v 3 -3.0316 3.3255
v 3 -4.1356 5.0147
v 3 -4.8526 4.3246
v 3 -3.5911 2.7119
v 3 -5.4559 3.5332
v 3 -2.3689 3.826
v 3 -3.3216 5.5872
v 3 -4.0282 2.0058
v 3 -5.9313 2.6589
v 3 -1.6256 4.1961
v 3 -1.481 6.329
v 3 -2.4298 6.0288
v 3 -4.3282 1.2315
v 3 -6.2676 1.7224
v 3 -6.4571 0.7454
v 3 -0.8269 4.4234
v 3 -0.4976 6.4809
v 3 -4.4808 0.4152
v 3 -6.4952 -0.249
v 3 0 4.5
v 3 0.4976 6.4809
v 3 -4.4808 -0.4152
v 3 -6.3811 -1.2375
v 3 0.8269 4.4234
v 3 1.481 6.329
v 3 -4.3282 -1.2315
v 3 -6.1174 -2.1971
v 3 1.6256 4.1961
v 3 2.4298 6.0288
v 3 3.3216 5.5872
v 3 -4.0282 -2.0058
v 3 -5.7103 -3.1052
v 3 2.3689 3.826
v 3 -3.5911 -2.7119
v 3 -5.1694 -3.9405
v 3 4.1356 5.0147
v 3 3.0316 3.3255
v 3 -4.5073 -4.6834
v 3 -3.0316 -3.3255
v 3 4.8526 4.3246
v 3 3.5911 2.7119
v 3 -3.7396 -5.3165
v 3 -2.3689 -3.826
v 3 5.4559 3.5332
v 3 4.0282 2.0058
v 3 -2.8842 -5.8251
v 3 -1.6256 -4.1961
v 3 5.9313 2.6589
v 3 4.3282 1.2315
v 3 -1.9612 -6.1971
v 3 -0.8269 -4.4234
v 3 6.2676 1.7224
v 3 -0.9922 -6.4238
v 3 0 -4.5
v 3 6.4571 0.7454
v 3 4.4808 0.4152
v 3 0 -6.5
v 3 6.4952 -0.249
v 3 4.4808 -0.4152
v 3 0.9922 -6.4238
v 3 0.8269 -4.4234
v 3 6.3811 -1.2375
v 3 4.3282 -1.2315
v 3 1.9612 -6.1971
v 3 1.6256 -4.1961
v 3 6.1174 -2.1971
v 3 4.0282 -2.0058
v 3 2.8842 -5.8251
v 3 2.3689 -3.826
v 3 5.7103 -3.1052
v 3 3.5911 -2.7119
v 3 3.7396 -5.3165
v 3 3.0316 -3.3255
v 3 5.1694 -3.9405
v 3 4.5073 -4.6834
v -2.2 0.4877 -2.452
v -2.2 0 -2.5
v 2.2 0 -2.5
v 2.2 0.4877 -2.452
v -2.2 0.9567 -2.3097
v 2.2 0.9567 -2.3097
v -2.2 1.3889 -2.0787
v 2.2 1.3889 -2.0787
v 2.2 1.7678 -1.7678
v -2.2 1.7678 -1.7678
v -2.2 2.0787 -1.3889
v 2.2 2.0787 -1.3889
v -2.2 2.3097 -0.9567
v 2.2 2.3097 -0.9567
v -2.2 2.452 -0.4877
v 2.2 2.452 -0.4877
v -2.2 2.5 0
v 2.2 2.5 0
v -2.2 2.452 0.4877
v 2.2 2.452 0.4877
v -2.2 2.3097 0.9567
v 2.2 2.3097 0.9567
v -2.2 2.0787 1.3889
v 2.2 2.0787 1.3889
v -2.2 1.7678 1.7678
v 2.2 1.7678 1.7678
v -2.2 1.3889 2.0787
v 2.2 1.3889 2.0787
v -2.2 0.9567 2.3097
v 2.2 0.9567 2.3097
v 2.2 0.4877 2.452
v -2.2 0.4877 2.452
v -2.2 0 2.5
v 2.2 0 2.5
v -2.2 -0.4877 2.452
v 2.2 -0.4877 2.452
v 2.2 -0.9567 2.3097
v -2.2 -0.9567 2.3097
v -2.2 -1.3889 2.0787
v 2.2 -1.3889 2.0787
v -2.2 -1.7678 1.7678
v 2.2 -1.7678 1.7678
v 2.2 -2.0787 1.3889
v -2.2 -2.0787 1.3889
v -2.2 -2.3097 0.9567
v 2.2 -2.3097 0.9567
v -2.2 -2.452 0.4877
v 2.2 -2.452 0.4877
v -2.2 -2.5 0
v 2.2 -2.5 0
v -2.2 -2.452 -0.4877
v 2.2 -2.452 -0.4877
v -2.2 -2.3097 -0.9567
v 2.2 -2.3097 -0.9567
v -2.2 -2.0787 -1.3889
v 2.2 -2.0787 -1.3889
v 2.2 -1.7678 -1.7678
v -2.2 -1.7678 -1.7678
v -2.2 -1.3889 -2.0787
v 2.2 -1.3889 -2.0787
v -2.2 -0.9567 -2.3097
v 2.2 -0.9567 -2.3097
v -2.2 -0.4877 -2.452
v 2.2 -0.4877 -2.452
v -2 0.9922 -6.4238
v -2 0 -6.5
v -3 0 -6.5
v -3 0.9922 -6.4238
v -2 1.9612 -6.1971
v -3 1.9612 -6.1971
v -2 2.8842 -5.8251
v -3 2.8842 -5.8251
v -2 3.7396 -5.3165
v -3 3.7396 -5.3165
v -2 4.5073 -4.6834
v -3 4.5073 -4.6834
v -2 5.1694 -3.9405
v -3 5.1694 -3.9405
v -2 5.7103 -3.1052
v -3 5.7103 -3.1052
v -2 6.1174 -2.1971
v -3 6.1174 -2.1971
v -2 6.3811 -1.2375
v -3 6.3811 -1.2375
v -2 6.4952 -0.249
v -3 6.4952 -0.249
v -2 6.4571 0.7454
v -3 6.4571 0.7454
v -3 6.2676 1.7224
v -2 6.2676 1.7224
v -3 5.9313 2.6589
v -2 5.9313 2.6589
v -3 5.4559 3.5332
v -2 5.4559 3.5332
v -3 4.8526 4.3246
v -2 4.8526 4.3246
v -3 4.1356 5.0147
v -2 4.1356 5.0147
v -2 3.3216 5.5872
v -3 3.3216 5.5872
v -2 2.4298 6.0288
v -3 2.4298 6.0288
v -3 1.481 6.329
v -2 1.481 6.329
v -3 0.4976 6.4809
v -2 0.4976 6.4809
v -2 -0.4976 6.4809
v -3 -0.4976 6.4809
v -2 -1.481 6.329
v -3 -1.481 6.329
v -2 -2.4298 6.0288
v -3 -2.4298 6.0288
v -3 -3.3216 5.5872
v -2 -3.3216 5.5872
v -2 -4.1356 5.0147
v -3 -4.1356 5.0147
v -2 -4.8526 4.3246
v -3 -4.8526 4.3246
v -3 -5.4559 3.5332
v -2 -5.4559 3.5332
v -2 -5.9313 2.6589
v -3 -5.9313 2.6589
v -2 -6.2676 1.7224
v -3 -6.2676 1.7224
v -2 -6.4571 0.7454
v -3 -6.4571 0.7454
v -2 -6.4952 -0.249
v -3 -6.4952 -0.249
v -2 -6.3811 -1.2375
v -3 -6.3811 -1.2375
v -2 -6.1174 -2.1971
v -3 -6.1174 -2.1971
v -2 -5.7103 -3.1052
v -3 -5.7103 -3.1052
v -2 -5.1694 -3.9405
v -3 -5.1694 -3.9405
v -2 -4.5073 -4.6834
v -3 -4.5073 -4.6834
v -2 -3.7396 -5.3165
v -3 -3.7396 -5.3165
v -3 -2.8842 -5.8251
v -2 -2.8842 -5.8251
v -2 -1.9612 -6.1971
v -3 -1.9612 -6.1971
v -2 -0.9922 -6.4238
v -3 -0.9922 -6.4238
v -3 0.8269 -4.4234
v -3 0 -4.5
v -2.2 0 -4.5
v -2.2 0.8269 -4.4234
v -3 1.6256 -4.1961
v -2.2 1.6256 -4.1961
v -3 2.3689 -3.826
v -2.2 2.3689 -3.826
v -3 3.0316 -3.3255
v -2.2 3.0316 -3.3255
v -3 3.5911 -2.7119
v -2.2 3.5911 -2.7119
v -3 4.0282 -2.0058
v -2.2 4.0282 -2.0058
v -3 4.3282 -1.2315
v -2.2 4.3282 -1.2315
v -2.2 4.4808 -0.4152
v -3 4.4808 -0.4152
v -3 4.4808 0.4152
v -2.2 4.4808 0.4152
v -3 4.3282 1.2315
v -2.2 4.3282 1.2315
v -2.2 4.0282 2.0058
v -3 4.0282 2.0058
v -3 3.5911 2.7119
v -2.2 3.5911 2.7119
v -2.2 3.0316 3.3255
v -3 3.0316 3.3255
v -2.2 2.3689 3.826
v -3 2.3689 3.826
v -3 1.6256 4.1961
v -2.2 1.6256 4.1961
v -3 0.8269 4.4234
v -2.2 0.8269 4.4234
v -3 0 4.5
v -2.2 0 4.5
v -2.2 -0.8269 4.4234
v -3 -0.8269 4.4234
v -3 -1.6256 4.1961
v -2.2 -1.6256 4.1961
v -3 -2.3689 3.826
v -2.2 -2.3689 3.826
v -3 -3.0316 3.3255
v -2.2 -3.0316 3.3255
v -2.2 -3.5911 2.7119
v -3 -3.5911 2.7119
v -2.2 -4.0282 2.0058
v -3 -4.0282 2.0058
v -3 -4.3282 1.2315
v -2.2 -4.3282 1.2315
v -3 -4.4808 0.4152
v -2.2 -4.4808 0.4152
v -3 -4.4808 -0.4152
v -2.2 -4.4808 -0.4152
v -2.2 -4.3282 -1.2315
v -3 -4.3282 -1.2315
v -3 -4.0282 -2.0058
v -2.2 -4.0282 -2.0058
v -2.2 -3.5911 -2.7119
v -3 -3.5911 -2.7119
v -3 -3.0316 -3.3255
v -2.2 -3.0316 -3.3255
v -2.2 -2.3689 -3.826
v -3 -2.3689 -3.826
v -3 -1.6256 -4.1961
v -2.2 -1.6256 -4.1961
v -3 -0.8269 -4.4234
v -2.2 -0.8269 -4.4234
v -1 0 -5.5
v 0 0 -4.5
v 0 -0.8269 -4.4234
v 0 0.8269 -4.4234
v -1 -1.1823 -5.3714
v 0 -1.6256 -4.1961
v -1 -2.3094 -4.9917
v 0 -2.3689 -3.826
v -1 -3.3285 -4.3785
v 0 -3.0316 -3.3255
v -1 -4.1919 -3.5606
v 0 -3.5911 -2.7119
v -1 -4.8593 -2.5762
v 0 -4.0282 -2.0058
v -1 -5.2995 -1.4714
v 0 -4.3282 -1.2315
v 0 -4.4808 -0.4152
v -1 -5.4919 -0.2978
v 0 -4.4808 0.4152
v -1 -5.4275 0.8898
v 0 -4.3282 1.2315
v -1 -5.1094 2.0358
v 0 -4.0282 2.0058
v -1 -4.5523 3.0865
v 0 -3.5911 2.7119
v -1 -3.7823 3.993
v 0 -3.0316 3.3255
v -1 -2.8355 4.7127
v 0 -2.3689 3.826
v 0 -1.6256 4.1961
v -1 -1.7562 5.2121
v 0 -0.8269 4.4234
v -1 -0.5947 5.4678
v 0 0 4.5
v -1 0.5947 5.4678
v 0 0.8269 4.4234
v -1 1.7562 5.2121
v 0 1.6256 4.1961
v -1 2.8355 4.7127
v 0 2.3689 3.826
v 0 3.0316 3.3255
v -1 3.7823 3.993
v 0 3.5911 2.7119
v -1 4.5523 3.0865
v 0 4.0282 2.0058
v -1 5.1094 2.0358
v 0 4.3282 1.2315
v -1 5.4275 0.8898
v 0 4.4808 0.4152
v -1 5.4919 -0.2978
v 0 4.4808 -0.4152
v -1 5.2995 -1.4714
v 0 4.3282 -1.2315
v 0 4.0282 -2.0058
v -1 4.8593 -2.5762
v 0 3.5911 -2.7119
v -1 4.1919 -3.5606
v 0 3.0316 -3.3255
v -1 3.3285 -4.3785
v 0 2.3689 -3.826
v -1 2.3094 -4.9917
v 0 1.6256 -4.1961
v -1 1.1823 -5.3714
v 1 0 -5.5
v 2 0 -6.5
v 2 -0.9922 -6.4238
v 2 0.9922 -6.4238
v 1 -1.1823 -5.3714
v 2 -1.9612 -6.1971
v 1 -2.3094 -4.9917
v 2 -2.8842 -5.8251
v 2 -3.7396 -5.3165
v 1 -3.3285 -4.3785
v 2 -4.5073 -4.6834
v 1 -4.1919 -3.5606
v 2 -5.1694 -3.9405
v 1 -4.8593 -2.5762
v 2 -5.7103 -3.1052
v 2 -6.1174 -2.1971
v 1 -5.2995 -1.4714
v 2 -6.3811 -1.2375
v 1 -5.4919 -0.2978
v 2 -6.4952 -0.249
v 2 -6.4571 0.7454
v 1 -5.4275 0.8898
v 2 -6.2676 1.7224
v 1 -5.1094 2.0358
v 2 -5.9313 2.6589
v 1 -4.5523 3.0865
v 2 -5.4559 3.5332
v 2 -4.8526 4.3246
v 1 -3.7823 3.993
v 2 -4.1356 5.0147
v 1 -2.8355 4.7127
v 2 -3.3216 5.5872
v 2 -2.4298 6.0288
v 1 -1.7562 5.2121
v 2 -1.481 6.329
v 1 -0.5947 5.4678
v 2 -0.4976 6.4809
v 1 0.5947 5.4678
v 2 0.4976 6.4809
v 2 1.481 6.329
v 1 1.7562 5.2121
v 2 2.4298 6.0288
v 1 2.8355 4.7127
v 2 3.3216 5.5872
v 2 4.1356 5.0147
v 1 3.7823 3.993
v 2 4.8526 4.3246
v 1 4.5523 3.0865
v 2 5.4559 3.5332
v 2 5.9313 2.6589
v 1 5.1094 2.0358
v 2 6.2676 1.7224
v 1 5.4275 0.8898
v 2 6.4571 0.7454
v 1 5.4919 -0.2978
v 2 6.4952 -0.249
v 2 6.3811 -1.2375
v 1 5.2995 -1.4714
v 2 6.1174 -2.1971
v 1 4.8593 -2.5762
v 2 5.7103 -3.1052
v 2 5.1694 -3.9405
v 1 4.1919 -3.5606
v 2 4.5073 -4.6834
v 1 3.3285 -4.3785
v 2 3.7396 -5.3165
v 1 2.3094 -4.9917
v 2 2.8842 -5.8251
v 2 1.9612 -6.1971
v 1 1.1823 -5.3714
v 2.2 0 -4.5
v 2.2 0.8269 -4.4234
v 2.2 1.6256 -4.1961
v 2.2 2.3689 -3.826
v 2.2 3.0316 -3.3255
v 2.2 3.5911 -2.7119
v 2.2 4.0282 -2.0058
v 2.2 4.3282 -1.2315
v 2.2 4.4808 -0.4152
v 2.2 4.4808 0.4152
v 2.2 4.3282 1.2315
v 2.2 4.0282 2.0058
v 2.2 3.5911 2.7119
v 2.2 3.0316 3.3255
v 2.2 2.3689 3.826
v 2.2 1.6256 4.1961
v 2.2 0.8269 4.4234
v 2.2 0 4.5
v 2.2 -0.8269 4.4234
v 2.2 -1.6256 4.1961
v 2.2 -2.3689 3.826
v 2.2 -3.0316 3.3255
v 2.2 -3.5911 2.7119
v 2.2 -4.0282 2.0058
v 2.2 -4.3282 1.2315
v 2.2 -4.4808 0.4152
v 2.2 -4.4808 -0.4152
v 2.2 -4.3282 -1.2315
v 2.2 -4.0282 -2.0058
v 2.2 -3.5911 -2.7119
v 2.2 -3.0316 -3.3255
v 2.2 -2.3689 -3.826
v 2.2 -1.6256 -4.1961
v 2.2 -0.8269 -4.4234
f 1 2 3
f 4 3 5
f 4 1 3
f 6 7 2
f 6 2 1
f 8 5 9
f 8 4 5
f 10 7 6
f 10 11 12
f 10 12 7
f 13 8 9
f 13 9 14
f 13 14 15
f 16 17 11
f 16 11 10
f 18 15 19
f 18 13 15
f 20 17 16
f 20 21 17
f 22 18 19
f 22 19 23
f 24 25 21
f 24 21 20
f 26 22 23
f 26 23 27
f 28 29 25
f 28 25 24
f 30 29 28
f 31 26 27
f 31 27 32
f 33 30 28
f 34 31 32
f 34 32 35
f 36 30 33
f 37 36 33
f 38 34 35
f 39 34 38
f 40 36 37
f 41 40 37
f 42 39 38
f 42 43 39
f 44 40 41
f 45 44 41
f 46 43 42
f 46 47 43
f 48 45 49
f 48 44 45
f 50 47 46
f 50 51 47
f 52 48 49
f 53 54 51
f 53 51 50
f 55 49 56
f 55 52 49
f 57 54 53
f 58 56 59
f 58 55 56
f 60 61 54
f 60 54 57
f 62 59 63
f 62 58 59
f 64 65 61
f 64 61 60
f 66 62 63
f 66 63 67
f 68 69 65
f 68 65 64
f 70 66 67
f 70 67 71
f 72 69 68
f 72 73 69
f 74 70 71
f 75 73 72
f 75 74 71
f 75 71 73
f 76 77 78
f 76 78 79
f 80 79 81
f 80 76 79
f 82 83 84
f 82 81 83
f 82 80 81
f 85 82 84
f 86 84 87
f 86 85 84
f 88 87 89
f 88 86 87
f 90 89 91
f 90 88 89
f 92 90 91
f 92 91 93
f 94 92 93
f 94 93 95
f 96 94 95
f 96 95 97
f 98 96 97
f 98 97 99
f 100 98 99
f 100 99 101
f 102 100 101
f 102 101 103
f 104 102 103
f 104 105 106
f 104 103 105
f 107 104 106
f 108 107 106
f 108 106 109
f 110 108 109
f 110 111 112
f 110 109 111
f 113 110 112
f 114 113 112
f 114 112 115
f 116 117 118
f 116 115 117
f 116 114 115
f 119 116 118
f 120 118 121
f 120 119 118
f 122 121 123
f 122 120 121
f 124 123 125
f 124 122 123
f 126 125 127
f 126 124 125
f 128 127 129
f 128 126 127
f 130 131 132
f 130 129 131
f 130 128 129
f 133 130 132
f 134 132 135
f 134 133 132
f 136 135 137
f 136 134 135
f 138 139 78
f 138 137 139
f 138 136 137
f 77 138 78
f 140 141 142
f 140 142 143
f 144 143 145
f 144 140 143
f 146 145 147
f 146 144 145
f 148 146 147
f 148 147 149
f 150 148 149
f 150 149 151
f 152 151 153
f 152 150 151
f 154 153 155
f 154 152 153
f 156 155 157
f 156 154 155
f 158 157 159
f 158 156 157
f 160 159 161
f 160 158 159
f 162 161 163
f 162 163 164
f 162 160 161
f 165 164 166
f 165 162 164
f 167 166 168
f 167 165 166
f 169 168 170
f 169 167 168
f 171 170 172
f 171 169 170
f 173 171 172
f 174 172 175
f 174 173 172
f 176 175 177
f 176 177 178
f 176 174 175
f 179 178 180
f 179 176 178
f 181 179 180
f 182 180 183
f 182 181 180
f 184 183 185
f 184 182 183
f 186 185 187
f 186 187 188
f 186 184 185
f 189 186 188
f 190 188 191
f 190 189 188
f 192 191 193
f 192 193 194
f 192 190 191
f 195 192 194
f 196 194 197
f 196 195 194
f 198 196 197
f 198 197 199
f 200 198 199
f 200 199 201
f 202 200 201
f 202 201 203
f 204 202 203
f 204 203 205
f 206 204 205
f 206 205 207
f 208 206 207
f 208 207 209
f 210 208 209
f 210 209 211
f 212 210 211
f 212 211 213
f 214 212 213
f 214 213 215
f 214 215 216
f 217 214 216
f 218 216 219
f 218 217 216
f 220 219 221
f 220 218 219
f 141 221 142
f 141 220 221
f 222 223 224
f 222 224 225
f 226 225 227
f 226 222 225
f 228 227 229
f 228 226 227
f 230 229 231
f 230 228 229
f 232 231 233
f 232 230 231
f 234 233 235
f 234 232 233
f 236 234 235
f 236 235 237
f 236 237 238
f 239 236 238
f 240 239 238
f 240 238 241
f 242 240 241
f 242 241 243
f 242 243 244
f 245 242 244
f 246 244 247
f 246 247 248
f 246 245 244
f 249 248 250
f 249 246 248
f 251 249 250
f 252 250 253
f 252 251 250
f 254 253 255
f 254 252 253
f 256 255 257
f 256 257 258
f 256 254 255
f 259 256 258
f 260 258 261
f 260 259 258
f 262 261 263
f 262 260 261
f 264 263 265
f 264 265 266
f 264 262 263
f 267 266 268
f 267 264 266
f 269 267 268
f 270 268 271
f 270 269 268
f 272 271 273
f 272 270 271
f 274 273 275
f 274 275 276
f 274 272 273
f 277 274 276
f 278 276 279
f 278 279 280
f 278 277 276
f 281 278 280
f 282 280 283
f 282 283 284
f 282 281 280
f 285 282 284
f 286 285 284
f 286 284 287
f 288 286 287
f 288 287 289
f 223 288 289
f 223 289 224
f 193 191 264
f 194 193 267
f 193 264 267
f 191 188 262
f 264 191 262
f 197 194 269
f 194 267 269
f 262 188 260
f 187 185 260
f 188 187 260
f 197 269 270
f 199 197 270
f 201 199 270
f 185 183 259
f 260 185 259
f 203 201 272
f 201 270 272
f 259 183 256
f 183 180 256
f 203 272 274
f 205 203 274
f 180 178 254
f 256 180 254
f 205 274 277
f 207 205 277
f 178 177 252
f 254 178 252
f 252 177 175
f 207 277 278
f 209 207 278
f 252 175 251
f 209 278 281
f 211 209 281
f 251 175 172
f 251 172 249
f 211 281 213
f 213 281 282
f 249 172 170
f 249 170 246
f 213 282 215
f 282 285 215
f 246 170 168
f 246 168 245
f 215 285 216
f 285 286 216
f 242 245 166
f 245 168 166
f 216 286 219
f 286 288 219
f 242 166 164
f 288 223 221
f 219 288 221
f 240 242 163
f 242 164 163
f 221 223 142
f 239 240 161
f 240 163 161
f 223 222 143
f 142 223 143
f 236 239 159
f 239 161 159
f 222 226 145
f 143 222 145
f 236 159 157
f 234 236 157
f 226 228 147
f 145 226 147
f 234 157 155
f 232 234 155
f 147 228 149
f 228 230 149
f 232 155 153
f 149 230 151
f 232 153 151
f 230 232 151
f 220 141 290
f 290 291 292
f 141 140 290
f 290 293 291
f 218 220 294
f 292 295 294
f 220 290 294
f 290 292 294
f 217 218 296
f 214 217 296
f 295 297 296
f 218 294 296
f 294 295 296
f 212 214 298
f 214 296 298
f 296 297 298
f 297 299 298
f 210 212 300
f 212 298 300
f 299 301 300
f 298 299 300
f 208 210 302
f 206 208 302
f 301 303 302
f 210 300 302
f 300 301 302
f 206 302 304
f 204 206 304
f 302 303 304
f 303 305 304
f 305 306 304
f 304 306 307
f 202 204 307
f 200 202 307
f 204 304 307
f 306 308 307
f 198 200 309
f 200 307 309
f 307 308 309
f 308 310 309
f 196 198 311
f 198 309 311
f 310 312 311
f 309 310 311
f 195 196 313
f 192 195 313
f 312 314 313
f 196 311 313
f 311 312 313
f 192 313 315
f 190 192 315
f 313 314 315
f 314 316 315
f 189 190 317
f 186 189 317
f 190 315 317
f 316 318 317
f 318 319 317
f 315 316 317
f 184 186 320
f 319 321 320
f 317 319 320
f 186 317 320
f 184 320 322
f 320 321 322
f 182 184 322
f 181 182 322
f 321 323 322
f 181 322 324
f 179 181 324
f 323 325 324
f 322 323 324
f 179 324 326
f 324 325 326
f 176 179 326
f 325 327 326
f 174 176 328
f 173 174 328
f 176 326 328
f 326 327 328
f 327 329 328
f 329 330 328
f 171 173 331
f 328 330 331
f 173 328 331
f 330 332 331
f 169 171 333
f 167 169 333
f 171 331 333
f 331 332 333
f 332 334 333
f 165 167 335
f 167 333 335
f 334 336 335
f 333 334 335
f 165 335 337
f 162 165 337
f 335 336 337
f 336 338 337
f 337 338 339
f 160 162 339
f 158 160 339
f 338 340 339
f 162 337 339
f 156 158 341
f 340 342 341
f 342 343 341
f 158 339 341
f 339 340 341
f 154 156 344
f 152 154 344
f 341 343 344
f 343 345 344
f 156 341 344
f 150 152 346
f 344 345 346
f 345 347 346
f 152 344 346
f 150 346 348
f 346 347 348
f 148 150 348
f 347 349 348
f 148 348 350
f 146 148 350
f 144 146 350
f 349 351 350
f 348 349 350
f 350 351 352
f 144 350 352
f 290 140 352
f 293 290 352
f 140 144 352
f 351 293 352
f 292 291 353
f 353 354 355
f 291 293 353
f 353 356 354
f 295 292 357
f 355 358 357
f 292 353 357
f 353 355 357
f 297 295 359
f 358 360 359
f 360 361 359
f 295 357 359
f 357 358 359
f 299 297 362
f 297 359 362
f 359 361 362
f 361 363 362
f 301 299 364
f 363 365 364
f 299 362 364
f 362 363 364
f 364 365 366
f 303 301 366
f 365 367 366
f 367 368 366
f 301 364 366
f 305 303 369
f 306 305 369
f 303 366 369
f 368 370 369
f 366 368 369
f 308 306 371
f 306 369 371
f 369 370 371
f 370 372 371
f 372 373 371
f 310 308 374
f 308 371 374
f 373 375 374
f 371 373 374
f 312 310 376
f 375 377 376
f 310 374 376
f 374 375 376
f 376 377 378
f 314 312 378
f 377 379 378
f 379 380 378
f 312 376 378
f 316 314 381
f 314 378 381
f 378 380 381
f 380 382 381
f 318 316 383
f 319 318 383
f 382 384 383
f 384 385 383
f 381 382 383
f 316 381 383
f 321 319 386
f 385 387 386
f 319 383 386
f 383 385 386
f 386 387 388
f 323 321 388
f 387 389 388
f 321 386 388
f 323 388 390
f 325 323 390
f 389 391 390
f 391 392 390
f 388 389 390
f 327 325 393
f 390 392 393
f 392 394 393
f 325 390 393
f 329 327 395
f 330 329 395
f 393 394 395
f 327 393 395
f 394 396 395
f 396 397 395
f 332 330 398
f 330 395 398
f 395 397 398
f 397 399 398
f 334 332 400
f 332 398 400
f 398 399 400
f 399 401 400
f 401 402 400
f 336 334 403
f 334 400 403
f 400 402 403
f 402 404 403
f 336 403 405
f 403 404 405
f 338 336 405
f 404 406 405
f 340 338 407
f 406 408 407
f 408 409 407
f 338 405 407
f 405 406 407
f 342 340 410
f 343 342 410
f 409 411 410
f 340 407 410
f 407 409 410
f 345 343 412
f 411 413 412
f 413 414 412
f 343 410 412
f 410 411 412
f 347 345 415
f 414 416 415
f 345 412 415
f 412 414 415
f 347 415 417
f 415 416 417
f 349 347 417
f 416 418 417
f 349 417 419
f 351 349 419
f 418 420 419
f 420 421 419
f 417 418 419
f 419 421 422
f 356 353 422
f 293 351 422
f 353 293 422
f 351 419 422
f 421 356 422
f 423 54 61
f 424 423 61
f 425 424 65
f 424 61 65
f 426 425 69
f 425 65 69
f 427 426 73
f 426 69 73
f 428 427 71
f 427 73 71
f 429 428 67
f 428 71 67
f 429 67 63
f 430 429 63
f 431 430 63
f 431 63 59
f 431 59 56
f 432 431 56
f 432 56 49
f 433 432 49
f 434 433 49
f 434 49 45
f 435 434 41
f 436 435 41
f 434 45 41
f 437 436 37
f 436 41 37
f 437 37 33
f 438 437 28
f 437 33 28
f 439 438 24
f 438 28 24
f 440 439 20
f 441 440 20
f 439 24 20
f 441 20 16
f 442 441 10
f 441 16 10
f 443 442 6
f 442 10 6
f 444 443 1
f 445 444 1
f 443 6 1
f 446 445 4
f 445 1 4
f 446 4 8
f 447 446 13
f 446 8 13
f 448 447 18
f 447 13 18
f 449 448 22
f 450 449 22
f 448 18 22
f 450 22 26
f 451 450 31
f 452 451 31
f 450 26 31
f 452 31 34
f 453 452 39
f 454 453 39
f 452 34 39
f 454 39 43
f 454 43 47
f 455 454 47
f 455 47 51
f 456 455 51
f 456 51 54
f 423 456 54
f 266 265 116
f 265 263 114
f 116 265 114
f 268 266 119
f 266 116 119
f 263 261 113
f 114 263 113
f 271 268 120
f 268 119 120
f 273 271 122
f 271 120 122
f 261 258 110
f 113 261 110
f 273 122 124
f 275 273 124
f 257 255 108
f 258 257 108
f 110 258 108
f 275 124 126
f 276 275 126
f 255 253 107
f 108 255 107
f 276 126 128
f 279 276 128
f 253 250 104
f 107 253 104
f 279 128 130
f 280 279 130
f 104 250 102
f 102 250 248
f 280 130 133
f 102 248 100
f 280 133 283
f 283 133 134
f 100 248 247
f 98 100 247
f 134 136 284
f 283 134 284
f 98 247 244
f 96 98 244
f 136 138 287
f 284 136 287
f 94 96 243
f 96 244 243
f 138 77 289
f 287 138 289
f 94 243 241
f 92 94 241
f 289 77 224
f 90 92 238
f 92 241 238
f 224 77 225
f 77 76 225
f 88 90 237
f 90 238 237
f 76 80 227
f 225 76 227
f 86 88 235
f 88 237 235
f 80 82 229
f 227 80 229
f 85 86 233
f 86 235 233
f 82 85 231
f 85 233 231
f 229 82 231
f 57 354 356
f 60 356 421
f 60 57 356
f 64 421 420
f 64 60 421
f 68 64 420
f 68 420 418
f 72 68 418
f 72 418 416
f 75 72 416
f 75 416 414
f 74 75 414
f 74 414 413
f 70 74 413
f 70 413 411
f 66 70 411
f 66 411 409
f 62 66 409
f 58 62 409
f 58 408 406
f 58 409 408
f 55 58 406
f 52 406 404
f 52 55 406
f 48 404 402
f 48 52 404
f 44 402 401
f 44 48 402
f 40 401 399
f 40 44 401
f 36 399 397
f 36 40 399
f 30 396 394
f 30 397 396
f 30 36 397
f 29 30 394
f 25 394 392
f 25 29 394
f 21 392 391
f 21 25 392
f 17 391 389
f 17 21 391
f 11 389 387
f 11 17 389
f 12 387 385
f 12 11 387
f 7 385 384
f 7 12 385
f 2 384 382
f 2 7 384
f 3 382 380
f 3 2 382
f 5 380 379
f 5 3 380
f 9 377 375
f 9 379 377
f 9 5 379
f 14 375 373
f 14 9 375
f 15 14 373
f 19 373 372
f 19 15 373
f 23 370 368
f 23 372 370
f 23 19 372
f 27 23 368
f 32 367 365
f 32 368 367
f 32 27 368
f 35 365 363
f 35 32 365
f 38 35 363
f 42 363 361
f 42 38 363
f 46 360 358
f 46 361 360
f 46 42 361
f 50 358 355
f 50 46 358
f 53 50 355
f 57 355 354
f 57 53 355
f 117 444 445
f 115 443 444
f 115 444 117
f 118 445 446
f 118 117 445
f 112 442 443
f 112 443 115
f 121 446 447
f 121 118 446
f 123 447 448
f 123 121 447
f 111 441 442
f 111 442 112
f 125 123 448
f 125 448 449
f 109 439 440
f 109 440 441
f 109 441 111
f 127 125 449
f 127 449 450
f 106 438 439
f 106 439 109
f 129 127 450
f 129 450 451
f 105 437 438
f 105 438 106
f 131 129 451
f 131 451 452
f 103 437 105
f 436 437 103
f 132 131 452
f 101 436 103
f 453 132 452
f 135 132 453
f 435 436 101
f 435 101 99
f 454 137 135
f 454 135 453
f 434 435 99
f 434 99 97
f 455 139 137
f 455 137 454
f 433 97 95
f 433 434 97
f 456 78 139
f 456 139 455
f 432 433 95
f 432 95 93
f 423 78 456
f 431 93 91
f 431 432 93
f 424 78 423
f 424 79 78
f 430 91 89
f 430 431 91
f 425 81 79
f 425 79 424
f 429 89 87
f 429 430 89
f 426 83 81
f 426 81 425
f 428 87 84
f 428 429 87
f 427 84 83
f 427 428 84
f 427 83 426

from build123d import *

# Parameters (mm, degrees)
SKETCH1_R               = 6.5
BOSS_EXTRUDE1_DEPTH     = 3
SKETCH4_R               = 4.5
CUT_EXTRUDE1_DEPTH      = 0.8
CUT_EXTRUDE2_DEPTH      = 10.669539803
CUT_EXTRUDE2_DEPTH_BACK = 10.669539803
SKETCH5_R               = 2.5


with BuildPart() as part:
    # Sketch1 → Boss-Extrude1 (new, symmetric)
    with BuildSketch(Plane(origin=(0, 0, 0), x_dir=(0, 0, -1), z_dir=(1, 0, 0))):
        Circle(SKETCH1_R)
    extrude(amount=BOSS_EXTRUDE1_DEPTH, both=True)

    # Sketch2 → Cut-Revolve1 (revolve, cut)
    with BuildSketch(Plane.XY):
        Polygon((-2, 6.5), (0, 4.5), (2, 6.5), align=None)
    revolve(axis=Axis((3, 0, 0), (-1, 0, 0)), mode=Mode.SUBTRACT)

    # Sketch4 → Cut-Extrude1 (cut)
    with BuildSketch(Plane(origin=(3, 0, 0), x_dir=(0, 0, -1), z_dir=(1, 0, 0))):
        Circle(SKETCH4_R)
    cut_extrude1 = extrude(amount=-CUT_EXTRUDE1_DEPTH, mode=Mode.SUBTRACT)

    # Mirror1: Cut-Extrude1 across plane
    add(cut_extrude1.mirror(Plane(origin=(0, 0, 0), x_dir=(0, 0, 1), z_dir=(1, 0, 0))), mode=Mode.SUBTRACT)

    # Sketch5 → Cut-Extrude2 (cut, two sides: drawn at the far end of the back side and taken through both)
    with BuildSketch(Plane(origin=(0, 0, 0), x_dir=(0, 0, -1), z_dir=(1, 0, 0)).offset(-CUT_EXTRUDE2_DEPTH_BACK)):
        Circle(SKETCH5_R)
    extrude(amount=CUT_EXTRUDE2_DEPTH + CUT_EXTRUDE2_DEPTH_BACK, mode=Mode.SUBTRACT)


solid = part.part
